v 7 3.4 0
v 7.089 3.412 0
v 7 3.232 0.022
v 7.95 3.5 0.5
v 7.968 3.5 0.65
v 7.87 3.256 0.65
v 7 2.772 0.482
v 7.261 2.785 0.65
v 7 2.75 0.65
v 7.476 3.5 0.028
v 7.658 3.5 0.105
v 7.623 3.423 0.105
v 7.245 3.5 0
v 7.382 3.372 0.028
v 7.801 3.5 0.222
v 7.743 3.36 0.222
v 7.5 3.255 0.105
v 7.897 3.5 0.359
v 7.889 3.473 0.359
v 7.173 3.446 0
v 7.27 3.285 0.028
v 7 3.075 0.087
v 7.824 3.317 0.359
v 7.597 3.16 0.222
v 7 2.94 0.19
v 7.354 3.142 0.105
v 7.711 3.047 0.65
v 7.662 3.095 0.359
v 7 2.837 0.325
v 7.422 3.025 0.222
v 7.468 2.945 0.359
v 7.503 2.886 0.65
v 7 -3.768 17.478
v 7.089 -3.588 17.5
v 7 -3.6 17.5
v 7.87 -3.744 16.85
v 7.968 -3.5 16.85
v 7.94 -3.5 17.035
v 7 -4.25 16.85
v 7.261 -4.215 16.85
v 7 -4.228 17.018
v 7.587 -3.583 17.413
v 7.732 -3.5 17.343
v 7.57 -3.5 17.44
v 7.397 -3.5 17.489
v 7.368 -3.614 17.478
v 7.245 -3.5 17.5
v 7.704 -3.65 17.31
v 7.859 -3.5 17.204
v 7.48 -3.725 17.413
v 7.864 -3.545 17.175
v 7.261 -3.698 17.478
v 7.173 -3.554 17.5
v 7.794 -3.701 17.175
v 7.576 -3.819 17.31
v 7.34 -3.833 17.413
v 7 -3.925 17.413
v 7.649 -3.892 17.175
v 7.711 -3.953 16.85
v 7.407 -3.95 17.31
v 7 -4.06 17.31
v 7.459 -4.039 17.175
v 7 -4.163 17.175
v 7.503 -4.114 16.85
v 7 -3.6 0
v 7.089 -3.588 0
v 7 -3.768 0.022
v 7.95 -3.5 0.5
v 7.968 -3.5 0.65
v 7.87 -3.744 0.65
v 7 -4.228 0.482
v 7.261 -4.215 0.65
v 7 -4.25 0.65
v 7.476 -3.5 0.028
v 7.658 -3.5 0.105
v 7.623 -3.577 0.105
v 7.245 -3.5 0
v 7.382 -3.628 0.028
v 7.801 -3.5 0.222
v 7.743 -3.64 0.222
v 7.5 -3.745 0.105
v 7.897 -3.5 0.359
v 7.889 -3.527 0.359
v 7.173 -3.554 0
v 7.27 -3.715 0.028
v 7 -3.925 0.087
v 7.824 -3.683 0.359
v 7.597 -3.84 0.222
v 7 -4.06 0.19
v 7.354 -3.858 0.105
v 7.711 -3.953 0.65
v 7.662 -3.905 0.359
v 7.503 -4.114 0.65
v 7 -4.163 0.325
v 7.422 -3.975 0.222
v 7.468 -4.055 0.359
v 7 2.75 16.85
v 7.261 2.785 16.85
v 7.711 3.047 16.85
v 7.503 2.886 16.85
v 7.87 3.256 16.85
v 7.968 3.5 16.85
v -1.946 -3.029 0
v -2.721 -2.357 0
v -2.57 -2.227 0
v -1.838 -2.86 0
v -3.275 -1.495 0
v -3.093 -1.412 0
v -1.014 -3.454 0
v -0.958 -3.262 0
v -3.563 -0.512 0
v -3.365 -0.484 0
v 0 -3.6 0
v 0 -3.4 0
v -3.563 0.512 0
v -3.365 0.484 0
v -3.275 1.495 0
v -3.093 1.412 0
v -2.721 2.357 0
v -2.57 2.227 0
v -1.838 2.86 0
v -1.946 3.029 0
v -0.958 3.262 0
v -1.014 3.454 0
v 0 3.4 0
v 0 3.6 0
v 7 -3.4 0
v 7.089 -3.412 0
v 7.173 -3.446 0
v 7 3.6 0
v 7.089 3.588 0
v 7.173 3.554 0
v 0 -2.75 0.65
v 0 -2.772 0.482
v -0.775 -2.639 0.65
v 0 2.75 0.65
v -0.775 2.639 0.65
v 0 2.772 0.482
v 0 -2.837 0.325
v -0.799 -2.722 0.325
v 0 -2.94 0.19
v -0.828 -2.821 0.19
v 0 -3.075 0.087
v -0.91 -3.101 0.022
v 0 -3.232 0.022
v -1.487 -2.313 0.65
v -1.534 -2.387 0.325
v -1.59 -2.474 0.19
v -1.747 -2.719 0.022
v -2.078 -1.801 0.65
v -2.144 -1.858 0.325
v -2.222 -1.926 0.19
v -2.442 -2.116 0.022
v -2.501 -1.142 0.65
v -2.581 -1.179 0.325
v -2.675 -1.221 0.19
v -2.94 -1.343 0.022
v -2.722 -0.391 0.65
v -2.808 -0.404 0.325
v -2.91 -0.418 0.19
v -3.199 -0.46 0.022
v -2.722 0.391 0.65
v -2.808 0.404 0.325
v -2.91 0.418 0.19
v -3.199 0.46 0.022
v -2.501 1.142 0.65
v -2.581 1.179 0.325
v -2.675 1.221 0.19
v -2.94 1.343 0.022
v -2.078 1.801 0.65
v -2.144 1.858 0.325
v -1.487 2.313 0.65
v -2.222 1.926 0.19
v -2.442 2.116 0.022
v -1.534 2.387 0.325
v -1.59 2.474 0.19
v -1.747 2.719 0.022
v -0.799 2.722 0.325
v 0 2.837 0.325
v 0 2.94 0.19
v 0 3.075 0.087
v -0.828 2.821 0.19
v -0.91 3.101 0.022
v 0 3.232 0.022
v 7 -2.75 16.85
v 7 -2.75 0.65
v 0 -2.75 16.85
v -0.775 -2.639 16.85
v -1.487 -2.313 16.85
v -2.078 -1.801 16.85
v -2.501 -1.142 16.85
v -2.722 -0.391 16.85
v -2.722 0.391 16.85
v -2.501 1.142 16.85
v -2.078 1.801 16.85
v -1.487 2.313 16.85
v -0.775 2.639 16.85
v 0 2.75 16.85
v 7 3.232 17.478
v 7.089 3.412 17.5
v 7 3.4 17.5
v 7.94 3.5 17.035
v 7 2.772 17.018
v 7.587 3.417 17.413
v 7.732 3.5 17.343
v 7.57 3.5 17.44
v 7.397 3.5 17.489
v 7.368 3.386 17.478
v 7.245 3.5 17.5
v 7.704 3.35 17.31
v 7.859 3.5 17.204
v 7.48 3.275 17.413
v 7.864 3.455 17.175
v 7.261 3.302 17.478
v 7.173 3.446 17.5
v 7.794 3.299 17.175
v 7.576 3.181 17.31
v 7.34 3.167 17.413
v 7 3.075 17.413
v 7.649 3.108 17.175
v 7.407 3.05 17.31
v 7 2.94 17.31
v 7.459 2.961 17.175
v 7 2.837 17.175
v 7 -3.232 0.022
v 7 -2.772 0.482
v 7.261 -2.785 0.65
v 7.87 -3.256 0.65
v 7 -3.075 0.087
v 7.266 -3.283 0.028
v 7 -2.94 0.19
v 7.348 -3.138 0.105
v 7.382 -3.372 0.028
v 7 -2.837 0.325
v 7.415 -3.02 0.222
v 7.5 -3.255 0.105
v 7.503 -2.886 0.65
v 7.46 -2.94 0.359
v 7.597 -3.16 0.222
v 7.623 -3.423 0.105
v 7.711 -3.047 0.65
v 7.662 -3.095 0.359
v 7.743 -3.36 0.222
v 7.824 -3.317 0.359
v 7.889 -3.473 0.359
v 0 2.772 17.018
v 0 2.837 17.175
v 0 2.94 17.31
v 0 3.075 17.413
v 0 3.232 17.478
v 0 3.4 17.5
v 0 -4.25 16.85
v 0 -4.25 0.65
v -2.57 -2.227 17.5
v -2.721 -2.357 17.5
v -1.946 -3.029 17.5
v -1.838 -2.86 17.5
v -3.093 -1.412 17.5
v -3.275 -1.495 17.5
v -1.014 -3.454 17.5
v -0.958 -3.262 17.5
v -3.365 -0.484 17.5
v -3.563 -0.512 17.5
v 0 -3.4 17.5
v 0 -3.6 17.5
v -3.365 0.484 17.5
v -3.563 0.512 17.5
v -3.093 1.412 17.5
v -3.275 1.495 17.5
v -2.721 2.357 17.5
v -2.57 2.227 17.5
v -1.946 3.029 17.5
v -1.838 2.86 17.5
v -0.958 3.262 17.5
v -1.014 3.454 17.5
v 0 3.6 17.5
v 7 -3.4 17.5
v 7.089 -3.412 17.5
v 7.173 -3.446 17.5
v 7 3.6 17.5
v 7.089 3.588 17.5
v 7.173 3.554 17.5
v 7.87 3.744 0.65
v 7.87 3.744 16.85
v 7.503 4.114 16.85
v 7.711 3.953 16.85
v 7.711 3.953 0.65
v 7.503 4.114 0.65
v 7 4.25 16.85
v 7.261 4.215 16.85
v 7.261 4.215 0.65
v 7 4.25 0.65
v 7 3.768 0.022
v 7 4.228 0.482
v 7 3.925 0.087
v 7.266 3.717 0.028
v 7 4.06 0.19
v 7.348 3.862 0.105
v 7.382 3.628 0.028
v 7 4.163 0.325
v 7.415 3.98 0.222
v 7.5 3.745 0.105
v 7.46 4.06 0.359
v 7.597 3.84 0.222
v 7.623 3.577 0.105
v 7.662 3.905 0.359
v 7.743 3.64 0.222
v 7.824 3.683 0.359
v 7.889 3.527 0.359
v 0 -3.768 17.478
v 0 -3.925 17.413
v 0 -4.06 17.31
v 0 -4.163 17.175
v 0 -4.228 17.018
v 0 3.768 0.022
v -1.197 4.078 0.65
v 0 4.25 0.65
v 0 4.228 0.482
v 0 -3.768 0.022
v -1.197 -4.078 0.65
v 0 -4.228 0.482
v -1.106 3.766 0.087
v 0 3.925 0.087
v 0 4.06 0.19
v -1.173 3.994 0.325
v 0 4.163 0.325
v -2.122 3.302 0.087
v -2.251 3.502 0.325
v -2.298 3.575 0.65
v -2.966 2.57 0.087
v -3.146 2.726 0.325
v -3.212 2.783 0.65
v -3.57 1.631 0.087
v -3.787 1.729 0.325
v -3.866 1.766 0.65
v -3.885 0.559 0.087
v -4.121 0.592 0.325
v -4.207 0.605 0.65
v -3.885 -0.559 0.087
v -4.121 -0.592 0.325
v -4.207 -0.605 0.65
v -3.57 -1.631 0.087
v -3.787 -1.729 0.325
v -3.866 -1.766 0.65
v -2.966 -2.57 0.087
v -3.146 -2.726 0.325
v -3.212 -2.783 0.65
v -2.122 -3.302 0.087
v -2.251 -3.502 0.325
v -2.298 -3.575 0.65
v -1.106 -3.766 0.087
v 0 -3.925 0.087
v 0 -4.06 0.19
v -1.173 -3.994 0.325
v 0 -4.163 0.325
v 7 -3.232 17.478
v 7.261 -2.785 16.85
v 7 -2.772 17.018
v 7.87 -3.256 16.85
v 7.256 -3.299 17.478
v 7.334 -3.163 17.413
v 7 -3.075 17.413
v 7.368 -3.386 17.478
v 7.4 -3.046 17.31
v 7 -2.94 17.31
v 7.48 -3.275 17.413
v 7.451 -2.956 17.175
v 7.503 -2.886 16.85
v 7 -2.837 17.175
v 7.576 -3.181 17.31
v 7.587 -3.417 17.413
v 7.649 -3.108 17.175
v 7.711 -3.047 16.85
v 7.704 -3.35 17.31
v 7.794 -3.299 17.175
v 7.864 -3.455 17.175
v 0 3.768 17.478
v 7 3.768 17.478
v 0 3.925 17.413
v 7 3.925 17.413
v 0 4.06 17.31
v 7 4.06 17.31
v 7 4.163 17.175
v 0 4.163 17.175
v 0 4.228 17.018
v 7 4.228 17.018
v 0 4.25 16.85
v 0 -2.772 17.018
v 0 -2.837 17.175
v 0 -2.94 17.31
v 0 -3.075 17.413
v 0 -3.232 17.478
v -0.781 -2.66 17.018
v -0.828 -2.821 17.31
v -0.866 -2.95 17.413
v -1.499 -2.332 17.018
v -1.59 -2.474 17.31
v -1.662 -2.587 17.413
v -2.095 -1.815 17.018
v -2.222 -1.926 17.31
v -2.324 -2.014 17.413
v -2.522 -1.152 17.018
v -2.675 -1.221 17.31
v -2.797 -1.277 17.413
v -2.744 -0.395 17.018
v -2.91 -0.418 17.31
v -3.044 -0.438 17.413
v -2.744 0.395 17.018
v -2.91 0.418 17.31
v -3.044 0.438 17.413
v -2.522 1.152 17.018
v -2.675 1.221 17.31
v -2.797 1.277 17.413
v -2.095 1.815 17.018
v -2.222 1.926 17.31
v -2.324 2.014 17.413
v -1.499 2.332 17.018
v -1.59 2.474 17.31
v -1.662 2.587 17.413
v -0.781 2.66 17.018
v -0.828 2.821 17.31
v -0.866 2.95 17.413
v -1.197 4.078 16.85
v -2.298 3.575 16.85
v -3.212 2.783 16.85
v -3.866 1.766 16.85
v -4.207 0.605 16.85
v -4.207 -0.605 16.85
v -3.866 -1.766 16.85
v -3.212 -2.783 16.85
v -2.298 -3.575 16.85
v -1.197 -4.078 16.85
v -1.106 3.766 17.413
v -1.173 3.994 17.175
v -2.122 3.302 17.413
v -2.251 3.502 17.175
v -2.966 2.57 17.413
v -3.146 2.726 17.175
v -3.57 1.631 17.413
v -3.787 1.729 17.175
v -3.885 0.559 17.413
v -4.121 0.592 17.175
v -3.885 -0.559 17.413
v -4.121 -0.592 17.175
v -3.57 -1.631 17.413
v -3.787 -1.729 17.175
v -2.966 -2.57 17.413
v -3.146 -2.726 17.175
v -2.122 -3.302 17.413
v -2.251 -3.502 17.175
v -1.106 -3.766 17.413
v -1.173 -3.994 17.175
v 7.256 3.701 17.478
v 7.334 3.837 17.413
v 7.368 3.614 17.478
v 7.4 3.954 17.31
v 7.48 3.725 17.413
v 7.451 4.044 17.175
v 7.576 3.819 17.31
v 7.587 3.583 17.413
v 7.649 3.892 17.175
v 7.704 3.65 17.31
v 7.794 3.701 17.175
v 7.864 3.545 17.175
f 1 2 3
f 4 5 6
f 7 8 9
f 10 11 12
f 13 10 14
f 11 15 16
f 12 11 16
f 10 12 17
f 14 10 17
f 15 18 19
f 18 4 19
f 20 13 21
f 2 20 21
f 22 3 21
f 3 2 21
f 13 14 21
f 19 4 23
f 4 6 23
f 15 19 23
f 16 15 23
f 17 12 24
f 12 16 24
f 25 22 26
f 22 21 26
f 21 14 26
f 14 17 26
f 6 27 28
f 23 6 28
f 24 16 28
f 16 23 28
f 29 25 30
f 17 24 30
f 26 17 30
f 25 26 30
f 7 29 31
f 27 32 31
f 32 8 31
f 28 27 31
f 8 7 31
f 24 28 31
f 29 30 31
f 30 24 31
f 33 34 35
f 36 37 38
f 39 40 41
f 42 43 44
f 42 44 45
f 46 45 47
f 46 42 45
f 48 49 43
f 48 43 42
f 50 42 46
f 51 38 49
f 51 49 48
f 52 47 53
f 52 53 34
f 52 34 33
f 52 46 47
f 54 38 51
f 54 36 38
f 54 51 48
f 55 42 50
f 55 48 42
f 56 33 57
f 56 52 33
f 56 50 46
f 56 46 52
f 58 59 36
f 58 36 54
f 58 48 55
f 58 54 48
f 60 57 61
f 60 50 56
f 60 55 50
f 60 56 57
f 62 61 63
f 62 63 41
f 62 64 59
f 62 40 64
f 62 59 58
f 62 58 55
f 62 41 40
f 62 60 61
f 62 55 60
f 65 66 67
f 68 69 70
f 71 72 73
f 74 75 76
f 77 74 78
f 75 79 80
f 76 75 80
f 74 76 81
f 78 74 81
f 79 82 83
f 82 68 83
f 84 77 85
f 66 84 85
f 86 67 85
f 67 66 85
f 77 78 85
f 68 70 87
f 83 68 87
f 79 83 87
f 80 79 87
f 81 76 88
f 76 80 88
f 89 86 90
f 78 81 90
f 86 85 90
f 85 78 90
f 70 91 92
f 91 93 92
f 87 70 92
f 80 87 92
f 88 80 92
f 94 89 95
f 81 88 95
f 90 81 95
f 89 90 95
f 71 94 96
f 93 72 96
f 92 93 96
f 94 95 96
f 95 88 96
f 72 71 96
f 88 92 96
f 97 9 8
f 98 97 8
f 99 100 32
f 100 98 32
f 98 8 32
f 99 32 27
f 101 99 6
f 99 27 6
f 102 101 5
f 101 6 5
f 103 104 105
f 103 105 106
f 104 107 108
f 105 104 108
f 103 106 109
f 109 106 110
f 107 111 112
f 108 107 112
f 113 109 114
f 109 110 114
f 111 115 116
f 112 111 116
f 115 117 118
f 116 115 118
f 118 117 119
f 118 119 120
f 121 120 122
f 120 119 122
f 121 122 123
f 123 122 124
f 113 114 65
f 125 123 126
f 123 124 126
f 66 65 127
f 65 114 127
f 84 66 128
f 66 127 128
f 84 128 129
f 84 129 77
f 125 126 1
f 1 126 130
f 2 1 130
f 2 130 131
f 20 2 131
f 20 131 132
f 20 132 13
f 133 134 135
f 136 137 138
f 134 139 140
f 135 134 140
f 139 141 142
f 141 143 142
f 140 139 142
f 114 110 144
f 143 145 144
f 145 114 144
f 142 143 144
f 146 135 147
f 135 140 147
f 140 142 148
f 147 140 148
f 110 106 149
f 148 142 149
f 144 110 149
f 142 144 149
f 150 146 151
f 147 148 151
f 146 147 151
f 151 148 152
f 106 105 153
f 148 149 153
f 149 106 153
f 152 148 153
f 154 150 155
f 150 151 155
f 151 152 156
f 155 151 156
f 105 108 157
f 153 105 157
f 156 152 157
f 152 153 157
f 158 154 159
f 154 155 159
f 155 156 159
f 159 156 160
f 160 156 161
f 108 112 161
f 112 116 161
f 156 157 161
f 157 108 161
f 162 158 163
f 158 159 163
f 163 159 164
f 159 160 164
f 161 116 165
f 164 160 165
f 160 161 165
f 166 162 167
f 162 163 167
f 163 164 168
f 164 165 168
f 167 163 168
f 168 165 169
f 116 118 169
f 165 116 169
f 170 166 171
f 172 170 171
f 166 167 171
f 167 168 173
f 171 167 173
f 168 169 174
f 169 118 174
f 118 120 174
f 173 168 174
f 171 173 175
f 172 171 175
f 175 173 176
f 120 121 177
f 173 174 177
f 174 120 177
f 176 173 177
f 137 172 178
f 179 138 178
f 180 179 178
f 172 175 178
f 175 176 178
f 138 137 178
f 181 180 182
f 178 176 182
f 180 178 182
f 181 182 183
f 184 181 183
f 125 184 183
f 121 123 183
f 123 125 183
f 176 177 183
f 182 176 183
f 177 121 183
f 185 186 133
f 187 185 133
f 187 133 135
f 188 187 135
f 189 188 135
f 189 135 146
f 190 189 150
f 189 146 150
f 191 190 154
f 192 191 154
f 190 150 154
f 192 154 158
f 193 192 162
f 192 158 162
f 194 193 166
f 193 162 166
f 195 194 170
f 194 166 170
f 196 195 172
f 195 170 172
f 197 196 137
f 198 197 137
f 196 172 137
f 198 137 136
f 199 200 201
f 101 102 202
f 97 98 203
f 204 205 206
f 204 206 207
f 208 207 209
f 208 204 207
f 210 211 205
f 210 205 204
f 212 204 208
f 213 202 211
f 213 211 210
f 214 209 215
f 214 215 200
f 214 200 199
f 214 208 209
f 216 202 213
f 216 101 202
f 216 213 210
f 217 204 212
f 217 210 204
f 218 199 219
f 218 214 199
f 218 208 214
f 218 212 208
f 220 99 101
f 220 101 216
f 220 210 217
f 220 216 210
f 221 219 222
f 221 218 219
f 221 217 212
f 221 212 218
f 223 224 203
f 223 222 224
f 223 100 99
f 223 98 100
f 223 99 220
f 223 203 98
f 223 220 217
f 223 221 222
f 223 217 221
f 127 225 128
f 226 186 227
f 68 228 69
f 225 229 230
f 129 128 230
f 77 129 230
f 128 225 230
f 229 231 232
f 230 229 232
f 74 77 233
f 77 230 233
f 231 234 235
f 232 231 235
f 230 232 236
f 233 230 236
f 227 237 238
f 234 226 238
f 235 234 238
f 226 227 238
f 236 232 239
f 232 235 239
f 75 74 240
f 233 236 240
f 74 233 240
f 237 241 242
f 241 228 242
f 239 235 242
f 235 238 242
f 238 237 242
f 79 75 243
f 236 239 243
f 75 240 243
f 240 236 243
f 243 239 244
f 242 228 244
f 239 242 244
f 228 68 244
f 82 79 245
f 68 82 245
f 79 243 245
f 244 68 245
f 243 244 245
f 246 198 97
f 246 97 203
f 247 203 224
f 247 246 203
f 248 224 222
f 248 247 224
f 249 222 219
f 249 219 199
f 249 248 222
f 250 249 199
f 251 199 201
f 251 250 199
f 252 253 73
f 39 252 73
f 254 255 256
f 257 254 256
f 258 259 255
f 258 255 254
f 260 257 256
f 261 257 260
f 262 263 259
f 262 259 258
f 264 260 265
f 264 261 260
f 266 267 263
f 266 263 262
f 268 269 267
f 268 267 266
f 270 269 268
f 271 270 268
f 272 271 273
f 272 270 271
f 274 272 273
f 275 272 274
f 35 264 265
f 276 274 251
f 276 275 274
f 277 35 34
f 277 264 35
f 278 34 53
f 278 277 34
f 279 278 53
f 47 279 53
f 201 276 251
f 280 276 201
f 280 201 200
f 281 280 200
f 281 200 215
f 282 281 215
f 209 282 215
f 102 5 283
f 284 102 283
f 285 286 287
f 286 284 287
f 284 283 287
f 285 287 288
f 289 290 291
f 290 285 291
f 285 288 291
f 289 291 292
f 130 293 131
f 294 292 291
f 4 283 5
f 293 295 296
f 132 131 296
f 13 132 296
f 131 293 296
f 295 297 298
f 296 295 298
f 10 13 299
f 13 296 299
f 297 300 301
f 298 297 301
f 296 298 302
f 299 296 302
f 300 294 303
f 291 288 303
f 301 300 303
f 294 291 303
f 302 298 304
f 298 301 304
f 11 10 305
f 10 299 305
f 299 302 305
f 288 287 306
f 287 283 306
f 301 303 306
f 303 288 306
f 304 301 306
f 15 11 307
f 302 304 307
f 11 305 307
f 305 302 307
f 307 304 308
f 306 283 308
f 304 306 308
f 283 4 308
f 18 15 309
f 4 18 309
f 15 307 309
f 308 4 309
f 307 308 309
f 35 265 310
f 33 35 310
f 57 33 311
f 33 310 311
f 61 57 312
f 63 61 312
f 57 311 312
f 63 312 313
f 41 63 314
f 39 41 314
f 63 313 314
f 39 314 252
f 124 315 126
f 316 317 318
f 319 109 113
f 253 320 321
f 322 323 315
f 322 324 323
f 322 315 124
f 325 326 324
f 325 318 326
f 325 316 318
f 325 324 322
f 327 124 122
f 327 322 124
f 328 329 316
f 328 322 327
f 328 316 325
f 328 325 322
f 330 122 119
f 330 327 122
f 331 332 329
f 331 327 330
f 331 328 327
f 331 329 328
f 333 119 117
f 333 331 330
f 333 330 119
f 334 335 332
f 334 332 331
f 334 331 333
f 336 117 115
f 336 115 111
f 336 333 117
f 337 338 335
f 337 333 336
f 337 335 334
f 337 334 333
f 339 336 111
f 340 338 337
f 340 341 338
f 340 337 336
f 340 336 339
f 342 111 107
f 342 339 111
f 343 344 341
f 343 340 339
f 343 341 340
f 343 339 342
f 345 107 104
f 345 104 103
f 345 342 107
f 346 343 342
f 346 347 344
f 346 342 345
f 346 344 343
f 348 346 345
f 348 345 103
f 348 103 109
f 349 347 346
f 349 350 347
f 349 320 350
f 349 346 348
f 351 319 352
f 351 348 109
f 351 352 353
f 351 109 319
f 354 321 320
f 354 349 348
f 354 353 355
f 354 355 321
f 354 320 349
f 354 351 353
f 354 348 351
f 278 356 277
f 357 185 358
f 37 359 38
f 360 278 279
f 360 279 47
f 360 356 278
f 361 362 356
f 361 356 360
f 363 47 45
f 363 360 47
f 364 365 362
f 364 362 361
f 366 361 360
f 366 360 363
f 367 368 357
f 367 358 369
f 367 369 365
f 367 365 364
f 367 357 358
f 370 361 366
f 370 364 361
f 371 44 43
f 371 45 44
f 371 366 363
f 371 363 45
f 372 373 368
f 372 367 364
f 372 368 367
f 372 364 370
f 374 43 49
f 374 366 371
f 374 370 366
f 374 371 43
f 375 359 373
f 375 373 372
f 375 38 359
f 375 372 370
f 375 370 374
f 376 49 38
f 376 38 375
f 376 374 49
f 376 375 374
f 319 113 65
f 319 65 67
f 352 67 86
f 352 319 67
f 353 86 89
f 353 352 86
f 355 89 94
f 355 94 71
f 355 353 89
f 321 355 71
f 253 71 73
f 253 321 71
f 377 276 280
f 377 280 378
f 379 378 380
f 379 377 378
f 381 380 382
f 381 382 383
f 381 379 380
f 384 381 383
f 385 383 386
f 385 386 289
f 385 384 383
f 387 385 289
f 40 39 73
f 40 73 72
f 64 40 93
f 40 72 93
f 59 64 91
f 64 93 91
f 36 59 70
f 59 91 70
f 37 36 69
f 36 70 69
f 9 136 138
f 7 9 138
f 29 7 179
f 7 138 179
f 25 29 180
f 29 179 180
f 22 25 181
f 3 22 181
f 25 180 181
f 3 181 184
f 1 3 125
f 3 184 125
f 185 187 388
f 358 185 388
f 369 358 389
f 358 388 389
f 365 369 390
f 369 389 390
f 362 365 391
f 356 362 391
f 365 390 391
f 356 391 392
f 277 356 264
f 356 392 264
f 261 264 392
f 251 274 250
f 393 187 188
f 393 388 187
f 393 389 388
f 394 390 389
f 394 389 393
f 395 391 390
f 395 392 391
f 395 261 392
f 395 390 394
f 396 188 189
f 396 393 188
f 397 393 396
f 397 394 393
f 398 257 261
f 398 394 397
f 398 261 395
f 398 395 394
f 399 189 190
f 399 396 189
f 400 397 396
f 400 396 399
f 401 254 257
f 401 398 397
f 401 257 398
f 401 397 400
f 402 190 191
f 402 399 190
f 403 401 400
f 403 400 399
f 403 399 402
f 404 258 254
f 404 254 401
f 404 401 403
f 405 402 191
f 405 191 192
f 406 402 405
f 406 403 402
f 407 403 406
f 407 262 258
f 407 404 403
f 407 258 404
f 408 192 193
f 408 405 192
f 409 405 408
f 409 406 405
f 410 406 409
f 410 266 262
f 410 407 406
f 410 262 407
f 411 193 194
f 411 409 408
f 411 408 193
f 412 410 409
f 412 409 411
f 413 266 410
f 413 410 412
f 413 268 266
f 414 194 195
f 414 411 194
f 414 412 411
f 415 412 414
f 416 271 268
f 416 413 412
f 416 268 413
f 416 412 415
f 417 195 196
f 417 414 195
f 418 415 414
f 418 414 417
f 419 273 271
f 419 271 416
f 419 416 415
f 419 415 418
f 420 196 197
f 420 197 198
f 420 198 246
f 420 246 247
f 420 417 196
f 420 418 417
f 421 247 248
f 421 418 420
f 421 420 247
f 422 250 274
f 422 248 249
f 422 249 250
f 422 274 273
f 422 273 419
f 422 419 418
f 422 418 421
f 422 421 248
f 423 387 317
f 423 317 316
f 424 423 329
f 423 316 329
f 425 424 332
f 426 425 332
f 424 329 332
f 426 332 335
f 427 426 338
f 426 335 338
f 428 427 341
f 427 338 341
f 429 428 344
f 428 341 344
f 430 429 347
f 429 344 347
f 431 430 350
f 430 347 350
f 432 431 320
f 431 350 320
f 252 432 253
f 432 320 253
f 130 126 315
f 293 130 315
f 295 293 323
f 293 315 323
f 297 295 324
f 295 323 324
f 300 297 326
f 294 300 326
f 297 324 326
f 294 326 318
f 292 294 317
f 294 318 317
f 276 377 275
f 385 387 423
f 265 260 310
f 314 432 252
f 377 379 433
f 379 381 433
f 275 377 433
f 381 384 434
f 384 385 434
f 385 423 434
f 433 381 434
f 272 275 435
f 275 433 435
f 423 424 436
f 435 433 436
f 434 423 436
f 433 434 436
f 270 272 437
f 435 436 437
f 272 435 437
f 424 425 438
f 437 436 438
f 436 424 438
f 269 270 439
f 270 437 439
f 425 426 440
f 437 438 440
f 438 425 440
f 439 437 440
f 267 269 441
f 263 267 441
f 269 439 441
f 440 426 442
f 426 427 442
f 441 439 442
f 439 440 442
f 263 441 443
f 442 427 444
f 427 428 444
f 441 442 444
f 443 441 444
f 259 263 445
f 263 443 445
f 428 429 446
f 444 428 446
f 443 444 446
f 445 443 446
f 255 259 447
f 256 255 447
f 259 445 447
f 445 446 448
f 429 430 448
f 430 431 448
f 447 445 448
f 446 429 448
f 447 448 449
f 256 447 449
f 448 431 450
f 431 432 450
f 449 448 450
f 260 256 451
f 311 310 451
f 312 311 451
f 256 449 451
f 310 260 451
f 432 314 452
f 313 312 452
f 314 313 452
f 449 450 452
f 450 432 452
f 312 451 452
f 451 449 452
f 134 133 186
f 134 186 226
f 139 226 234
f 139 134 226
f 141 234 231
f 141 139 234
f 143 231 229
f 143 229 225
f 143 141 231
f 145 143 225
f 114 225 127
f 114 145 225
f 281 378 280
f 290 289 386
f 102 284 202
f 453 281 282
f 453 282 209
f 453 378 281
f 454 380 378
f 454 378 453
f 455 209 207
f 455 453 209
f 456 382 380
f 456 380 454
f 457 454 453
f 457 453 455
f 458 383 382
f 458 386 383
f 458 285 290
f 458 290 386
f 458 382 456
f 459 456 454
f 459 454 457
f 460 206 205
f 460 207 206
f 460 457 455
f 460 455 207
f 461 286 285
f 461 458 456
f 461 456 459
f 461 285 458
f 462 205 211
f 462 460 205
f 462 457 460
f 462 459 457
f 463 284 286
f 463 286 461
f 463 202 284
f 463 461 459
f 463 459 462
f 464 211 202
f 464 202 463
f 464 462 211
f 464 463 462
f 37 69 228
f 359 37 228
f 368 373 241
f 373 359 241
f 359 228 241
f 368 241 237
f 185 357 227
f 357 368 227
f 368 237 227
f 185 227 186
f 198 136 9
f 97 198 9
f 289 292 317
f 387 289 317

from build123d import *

# Parameters (mm, degrees)
F1_DEPTH     = 17.5
F2_T1_DEPTH  = 22.5
F3_T1_DEPTH  = 7
F3_T4_ANGLE  = 168.6544636073
F3_T6_ANGLE  = 168.6544636073
F3_T8_ANGLE  = 180
F3_T10_ANGLE = 168.6544636073
F3_T12_ANGLE = 168.6544636073
F3_T14_ANGLE = 180
F3_T16_ANGLE = 168.6544636073
F3_T18_ANGLE = 168.6544636073
F3_T20_ANGLE = 180
F3_T22_ANGLE = 168.6544636073
F3_T24_ANGLE = 168.6544636073
F3_T26_ANGLE = 180


# Not quite as in the source:
# - a fillet or chamfer that OpenCascade refuses, or shapes differently, is made with other operations: its cross-section is extruded or revolved along the edge and cut away or added


with BuildPart() as f1:
    # F0 (on Top) → F1 (new body)
    with BuildSketch(Plane.XY):
        with BuildLine():
            ThreePointArc((0, -2.75), (-2.75, 0), (0, 2.75))
            Line((0, 2.75), (8, 2.75))
            Line((8, 2.75), (8, 4.25))
            Line((8, 4.25), (0, 4.25))
            ThreePointArc((0, 4.25), (-4.25, 0), (0, -4.25))
            Line((0, -4.25), (8, -4.25))
            Line((8, -4.25), (8, -2.75))
            Line((8, -2.75), (0, -2.75))
        make_face()
    extrude(amount=F1_DEPTH)

    # F2: fillet of radius 1 on 4 edges, made by hand

    # F2_s2 → F2_t1 (cut)
    with BuildSketch(Plane.XY.offset(-2.5)):
        with BuildLine():
            ThreePointArc((8, -3.75), (7.7071067812, -3.0428932188), (7, -2.75))
            Line((7, -2.75), (8, -2.75))
            Line((8, -2.75), (8, -3.75))
        make_face()
        with BuildLine():
            ThreePointArc((7, -4.25), (7.7071067812, -3.9571067812), (8, -3.25))
            Line((8, -3.25), (8, -4.25))
            Line((8, -4.25), (7, -4.25))
        make_face()
        with BuildLine():
            ThreePointArc((7, 2.75), (7.7071067812, 3.0428932188), (8, 3.75))
            Line((8, 3.75), (8, 2.75))
            Line((8, 2.75), (7, 2.75))
        make_face()
        with BuildLine():
            ThreePointArc((8, 3.25), (7.7071067812, 3.9571067812), (7, 4.25))
            Line((7, 4.25), (8, 4.25))
            Line((8, 4.25), (8, 3.25))
        make_face()
    extrude(amount=F2_T1_DEPTH, mode=Mode.SUBTRACT)

    # F3: fillet of radius 0.65 on 20 edges, made by hand

    # F3_s2 → F3_t1 (cut)
    with BuildSketch(Plane.YZ):
        with BuildLine():
            ThreePointArc((-2.75, 0.65), (-2.9403805922, 0.1903805922), (-3.4, 0))
            Line((-3.4, 0), (-2.75, 0))
            Line((-2.75, 0), (-2.75, 0.65))
        make_face()
        with BuildLine():
            ThreePointArc((-3.6, 0), (-4.0596194078, 0.1903805922), (-4.25, 0.65))
            Line((-4.25, 0.65), (-4.25, 0))
            Line((-4.25, 0), (-3.6, 0))
        make_face()
        with BuildLine():
            ThreePointArc((3.6, 0), (4.0596194078, 0.1903805922), (4.25, 0.65))
            Line((4.25, 0.65), (4.25, 0))
            Line((4.25, 0), (3.6, 0))
        make_face()
        with BuildLine():
            ThreePointArc((2.75, 0.65), (2.9403805922, 0.1903805922), (3.4, 0))
            Line((3.4, 0), (2.75, 0))
            Line((2.75, 0), (2.75, 0.65))
        make_face()
        with BuildLine():
            ThreePointArc((-2.75, 16.85), (-2.9403805922, 17.3096194078), (-3.4, 17.5))
            Line((-3.4, 17.5), (-2.75, 17.5))
            Line((-2.75, 17.5), (-2.75, 16.85))
        make_face()
        with BuildLine():
            ThreePointArc((-3.6, 17.5), (-4.0596194078, 17.3096194078), (-4.25, 16.85))
            Line((-4.25, 16.85), (-4.25, 17.5))
            Line((-4.25, 17.5), (-3.6, 17.5))
        make_face()
        with BuildLine():
            ThreePointArc((3.6, 17.5), (4.0596194078, 17.3096194078), (4.25, 16.85))
            Line((4.25, 16.85), (4.25, 17.5))
            Line((4.25, 17.5), (3.6, 17.5))
        make_face()
        with BuildLine():
            ThreePointArc((2.75, 16.85), (2.9403805922, 17.3096194078), (3.4, 17.5))
            Line((3.4, 17.5), (2.75, 17.5))
            Line((2.75, 17.5), (2.75, 16.85))
        make_face()
    extrude(amount=F3_T1_DEPTH, mode=Mode.SUBTRACT)

    # F3_s3 → F3_t4 (revolve, cut)
    with BuildSketch(Plane.YZ.offset(7)):
        with BuildLine():
            ThreePointArc((-3.4, 0), (-2.9403805922, 0.1903805922), (-2.75, 0.65))
            Line((-2.75, 0.65), (-2.75, 0))
            Line((-2.75, 0), (-3.4, 0))
        make_face()
    revolve(axis=Axis((7, -3.75, 0), (0, 0, -1)), revolution_arc=F3_T4_ANGLE, mode=Mode.SUBTRACT)

    # F3_s5 → F3_t6 (revolve, cut)
    with BuildSketch(Plane(origin=(7.3559574547, -1.4759459573, 0), x_dir=(0, 0, 1), z_dir=(-0.9804586187, 0.1967254356, 0))):
        with BuildLine():
            ThreePointArc((0, -1.4594124616), (0.1903805922, -0.9997930538), (0.65, -0.8094124616))
            Line((0.65, -0.8094124616), (0, -0.8094124616))
            Line((0, -0.8094124616), (0, -1.4594124616))
        make_face()
    revolve(axis=Axis((7, -3.25, 0), (0, 0, -1)), revolution_arc=F3_T6_ANGLE, mode=Mode.SUBTRACT)

    # F3_s7 → F3_t8 (revolve, cut)
    with BuildSketch(Plane.YZ):
        with BuildLine():
            ThreePointArc((3.6, 0), (4.0596194078, 0.1903805922), (4.25, 0.65))
            Line((4.25, 0.65), (4.25, 0))
            Line((4.25, 0), (3.6, 0))
        make_face()
    revolve(axis=Axis((0, 0, 0), (0, 0, 1)), revolution_arc=F3_T8_ANGLE, mode=Mode.SUBTRACT)

    # F3_s9 → F3_t10 (revolve, cut)
    with BuildSketch(Plane.YZ.offset(7)):
        with BuildLine():
            ThreePointArc((3.6, 0), (4.0596194078, 0.1903805922), (4.25, 0.65))
            Line((4.25, 0.65), (4.25, 0))
            Line((4.25, 0), (3.6, 0))
        make_face()
    revolve(axis=Axis((7, 3.25, 0), (0, 0, -1)), revolution_arc=F3_T10_ANGLE, mode=Mode.SUBTRACT)

    # F3_s11 → F3_t12 (revolve, cut)
    with BuildSketch(Plane(origin=(6.0057894127, -1.2050396782, 0), x_dir=(0, 0, 1), z_dir=(-0.9804586187, 0.1967254356, 0))):
        with BuildLine():
            ThreePointArc((0, 5.4037978693), (0.1903805922, 5.8634172771), (0.65, 6.0537978693))
            Line((0.65, 6.0537978693), (0, 6.0537978693))
            Line((0, 6.0537978693), (0, 5.4037978693))
        make_face()
    revolve(axis=Axis((7, 3.75, 0), (0, 0, -1)), revolution_arc=F3_T12_ANGLE, mode=Mode.SUBTRACT)

    # F3_s13 → F3_t14 (revolve, cut)
    with BuildSketch(Plane.YZ):
        with BuildLine():
            ThreePointArc((-2.75, 0.65), (-2.9403805922, 0.1903805922), (-3.4, 0))
            Line((-3.4, 0), (-2.75, 0))
            Line((-2.75, 0), (-2.75, 0.65))
        make_face()
    revolve(axis=Axis((0, 0, 0), (0, 0, -1)), revolution_arc=F3_T14_ANGLE, mode=Mode.SUBTRACT)

    # F3_s15 → F3_t16 (revolve, cut)
    with BuildSketch(Plane.YZ.offset(7)):
        with BuildLine():
            ThreePointArc((-3.4, 17.5), (-2.9403805922, 17.3096194078), (-2.75, 16.85))
            Line((-2.75, 16.85), (-2.75, 17.5))
            Line((-2.75, 17.5), (-3.4, 17.5))
        make_face()
    revolve(axis=Axis((7, -3.75, 17.5), (0, 0, -1)), revolution_arc=F3_T16_ANGLE, mode=Mode.SUBTRACT)

    # F3_s17 → F3_t18 (revolve, cut)
    with BuildSketch(Plane(origin=(7.3559574547, -1.4759459573, 0), x_dir=(0, 0, 1), z_dir=(-0.9804586187, 0.1967254356, 0))):
        with BuildLine():
            ThreePointArc((17.5, -1.4594124616), (17.3096194078, -0.9997930538), (16.85, -0.8094124616))
            Line((16.85, -0.8094124616), (17.5, -0.8094124616))
            Line((17.5, -0.8094124616), (17.5, -1.4594124616))
        make_face()
    revolve(axis=Axis((7, -3.25, 17.5), (0, 0, -1)), revolution_arc=F3_T18_ANGLE, mode=Mode.SUBTRACT)

    # F3_s19 → F3_t20 (revolve, cut)
    with BuildSketch(Plane.YZ):
        with BuildLine():
            ThreePointArc((3.6, 17.5), (4.0596194078, 17.3096194078), (4.25, 16.85))
            Line((4.25, 16.85), (4.25, 17.5))
            Line((4.25, 17.5), (3.6, 17.5))
        make_face()
    revolve(axis=Axis((0, 0, 17.5), (0, 0, 1)), revolution_arc=F3_T20_ANGLE, mode=Mode.SUBTRACT)

    # F3_s21 → F3_t22 (revolve, cut)
    with BuildSketch(Plane.YZ.offset(7)):
        with BuildLine():
            ThreePointArc((3.6, 17.5), (4.0596194078, 17.3096194078), (4.25, 16.85))
            Line((4.25, 16.85), (4.25, 17.5))
            Line((4.25, 17.5), (3.6, 17.5))
        make_face()
    revolve(axis=Axis((7, 3.25, 17.5), (0, 0, -1)), revolution_arc=F3_T22_ANGLE, mode=Mode.SUBTRACT)

    # F3_s23 → F3_t24 (revolve, cut)
    with BuildSketch(Plane(origin=(6.0057894127, -1.2050396782, 0), x_dir=(0, 0, 1), z_dir=(-0.9804586187, 0.1967254356, 0))):
        with BuildLine():
            ThreePointArc((17.5, 5.4037978693), (17.3096194078, 5.8634172771), (16.85, 6.0537978693))
            Line((16.85, 6.0537978693), (17.5, 6.0537978693))
            Line((17.5, 6.0537978693), (17.5, 5.4037978693))
        make_face()
    revolve(axis=Axis((7, 3.75, 17.5), (0, 0, -1)), revolution_arc=F3_T24_ANGLE, mode=Mode.SUBTRACT)

    # F3_s25 → F3_t26 (revolve, cut)
    with BuildSketch(Plane.YZ):
        with BuildLine():
            ThreePointArc((-2.75, 16.85), (-2.9403805922, 17.3096194078), (-3.4, 17.5))
            Line((-3.4, 17.5), (-2.75, 17.5))
            Line((-2.75, 17.5), (-2.75, 16.85))
        make_face()
    revolve(axis=Axis((0, 0, 17.5), (0, 0, -1)), revolution_arc=F3_T26_ANGLE, mode=Mode.SUBTRACT)


solid = f1.part
